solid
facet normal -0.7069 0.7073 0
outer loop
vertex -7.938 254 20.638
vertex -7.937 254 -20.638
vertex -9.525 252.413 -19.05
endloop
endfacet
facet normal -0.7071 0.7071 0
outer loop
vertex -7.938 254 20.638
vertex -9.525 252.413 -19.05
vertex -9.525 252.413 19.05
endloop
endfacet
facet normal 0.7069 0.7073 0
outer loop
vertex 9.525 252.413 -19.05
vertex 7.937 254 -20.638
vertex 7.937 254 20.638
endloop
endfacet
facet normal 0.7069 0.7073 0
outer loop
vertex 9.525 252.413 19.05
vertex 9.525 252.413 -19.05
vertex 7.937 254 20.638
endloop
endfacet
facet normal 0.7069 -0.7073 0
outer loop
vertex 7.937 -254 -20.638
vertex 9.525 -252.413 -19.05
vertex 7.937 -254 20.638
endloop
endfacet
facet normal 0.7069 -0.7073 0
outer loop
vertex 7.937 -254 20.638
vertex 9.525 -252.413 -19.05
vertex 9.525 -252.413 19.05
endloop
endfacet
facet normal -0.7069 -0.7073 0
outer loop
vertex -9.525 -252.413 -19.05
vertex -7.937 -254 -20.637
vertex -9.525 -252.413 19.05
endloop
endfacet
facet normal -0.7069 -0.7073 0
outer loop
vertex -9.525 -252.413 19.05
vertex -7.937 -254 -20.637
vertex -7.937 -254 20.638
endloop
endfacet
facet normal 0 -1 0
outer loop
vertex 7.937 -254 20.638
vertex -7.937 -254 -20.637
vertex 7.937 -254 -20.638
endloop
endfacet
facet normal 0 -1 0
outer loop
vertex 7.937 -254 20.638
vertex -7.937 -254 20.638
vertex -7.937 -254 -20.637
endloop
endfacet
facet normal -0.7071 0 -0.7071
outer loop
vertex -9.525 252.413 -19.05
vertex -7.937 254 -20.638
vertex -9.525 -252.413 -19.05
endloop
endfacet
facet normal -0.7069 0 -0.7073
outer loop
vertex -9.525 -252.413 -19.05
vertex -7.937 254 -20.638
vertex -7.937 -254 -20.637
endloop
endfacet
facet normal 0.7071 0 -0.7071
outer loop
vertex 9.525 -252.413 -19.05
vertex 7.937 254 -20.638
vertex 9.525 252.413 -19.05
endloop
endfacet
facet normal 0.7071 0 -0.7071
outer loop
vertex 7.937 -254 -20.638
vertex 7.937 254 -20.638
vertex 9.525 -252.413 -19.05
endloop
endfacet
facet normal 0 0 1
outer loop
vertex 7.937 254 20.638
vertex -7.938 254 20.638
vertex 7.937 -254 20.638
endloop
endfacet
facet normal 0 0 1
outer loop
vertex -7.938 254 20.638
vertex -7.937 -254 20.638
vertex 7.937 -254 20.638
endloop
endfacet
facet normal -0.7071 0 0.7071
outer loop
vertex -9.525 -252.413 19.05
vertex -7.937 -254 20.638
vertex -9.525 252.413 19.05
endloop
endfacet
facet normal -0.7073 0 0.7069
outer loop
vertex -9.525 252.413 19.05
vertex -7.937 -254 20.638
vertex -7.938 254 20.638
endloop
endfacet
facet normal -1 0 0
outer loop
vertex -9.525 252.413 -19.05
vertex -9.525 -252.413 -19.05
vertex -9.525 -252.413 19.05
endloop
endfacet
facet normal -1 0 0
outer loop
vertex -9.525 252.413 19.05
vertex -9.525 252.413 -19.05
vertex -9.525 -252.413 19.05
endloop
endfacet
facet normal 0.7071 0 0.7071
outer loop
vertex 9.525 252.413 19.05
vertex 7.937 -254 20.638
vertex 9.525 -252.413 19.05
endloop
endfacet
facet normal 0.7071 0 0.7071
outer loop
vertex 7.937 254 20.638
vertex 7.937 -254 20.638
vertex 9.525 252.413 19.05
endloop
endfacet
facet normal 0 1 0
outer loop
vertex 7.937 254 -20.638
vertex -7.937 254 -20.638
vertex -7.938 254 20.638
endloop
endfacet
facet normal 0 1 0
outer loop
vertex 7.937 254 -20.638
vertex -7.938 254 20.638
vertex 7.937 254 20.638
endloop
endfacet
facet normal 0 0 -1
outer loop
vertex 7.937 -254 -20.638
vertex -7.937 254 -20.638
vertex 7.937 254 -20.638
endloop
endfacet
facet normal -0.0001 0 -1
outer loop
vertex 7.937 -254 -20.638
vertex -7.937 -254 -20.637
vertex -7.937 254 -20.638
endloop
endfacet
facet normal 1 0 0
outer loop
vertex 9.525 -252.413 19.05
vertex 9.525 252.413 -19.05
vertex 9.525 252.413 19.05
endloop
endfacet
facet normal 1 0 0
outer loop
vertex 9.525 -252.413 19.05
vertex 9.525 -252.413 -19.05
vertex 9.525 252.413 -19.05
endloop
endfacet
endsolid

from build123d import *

# Parameters (mm, degrees)
F0_W     = 19.05
F0_H     = 41.275
F1_DEPTH = 254
F3_SIZE  = 1.5875


with BuildPart() as f1:
    # F0 (on Front) → F1 (new body, symmetric)
    with BuildSketch(Plane.XZ):
        Rectangle(F0_W, F0_H)
    extrude(amount=F1_DEPTH, both=True)

    # F3
    f3_edges = [f1.edges().sort_by_distance(p)[0] for p in [
        (-9.525, 0, 20.6375),
        (-9.525, 254, 0),
        (-9.525, 0, -20.6375),
        (-9.525, -254, 0),
        (9.525, 254, 0),
        (9.525, 0, 20.6375),
        (9.525, -254, 0),
        (9.525, 0, -20.6375),
    ]]
    chamfer(f3_edges, length=F3_SIZE)


solid = f1.part
